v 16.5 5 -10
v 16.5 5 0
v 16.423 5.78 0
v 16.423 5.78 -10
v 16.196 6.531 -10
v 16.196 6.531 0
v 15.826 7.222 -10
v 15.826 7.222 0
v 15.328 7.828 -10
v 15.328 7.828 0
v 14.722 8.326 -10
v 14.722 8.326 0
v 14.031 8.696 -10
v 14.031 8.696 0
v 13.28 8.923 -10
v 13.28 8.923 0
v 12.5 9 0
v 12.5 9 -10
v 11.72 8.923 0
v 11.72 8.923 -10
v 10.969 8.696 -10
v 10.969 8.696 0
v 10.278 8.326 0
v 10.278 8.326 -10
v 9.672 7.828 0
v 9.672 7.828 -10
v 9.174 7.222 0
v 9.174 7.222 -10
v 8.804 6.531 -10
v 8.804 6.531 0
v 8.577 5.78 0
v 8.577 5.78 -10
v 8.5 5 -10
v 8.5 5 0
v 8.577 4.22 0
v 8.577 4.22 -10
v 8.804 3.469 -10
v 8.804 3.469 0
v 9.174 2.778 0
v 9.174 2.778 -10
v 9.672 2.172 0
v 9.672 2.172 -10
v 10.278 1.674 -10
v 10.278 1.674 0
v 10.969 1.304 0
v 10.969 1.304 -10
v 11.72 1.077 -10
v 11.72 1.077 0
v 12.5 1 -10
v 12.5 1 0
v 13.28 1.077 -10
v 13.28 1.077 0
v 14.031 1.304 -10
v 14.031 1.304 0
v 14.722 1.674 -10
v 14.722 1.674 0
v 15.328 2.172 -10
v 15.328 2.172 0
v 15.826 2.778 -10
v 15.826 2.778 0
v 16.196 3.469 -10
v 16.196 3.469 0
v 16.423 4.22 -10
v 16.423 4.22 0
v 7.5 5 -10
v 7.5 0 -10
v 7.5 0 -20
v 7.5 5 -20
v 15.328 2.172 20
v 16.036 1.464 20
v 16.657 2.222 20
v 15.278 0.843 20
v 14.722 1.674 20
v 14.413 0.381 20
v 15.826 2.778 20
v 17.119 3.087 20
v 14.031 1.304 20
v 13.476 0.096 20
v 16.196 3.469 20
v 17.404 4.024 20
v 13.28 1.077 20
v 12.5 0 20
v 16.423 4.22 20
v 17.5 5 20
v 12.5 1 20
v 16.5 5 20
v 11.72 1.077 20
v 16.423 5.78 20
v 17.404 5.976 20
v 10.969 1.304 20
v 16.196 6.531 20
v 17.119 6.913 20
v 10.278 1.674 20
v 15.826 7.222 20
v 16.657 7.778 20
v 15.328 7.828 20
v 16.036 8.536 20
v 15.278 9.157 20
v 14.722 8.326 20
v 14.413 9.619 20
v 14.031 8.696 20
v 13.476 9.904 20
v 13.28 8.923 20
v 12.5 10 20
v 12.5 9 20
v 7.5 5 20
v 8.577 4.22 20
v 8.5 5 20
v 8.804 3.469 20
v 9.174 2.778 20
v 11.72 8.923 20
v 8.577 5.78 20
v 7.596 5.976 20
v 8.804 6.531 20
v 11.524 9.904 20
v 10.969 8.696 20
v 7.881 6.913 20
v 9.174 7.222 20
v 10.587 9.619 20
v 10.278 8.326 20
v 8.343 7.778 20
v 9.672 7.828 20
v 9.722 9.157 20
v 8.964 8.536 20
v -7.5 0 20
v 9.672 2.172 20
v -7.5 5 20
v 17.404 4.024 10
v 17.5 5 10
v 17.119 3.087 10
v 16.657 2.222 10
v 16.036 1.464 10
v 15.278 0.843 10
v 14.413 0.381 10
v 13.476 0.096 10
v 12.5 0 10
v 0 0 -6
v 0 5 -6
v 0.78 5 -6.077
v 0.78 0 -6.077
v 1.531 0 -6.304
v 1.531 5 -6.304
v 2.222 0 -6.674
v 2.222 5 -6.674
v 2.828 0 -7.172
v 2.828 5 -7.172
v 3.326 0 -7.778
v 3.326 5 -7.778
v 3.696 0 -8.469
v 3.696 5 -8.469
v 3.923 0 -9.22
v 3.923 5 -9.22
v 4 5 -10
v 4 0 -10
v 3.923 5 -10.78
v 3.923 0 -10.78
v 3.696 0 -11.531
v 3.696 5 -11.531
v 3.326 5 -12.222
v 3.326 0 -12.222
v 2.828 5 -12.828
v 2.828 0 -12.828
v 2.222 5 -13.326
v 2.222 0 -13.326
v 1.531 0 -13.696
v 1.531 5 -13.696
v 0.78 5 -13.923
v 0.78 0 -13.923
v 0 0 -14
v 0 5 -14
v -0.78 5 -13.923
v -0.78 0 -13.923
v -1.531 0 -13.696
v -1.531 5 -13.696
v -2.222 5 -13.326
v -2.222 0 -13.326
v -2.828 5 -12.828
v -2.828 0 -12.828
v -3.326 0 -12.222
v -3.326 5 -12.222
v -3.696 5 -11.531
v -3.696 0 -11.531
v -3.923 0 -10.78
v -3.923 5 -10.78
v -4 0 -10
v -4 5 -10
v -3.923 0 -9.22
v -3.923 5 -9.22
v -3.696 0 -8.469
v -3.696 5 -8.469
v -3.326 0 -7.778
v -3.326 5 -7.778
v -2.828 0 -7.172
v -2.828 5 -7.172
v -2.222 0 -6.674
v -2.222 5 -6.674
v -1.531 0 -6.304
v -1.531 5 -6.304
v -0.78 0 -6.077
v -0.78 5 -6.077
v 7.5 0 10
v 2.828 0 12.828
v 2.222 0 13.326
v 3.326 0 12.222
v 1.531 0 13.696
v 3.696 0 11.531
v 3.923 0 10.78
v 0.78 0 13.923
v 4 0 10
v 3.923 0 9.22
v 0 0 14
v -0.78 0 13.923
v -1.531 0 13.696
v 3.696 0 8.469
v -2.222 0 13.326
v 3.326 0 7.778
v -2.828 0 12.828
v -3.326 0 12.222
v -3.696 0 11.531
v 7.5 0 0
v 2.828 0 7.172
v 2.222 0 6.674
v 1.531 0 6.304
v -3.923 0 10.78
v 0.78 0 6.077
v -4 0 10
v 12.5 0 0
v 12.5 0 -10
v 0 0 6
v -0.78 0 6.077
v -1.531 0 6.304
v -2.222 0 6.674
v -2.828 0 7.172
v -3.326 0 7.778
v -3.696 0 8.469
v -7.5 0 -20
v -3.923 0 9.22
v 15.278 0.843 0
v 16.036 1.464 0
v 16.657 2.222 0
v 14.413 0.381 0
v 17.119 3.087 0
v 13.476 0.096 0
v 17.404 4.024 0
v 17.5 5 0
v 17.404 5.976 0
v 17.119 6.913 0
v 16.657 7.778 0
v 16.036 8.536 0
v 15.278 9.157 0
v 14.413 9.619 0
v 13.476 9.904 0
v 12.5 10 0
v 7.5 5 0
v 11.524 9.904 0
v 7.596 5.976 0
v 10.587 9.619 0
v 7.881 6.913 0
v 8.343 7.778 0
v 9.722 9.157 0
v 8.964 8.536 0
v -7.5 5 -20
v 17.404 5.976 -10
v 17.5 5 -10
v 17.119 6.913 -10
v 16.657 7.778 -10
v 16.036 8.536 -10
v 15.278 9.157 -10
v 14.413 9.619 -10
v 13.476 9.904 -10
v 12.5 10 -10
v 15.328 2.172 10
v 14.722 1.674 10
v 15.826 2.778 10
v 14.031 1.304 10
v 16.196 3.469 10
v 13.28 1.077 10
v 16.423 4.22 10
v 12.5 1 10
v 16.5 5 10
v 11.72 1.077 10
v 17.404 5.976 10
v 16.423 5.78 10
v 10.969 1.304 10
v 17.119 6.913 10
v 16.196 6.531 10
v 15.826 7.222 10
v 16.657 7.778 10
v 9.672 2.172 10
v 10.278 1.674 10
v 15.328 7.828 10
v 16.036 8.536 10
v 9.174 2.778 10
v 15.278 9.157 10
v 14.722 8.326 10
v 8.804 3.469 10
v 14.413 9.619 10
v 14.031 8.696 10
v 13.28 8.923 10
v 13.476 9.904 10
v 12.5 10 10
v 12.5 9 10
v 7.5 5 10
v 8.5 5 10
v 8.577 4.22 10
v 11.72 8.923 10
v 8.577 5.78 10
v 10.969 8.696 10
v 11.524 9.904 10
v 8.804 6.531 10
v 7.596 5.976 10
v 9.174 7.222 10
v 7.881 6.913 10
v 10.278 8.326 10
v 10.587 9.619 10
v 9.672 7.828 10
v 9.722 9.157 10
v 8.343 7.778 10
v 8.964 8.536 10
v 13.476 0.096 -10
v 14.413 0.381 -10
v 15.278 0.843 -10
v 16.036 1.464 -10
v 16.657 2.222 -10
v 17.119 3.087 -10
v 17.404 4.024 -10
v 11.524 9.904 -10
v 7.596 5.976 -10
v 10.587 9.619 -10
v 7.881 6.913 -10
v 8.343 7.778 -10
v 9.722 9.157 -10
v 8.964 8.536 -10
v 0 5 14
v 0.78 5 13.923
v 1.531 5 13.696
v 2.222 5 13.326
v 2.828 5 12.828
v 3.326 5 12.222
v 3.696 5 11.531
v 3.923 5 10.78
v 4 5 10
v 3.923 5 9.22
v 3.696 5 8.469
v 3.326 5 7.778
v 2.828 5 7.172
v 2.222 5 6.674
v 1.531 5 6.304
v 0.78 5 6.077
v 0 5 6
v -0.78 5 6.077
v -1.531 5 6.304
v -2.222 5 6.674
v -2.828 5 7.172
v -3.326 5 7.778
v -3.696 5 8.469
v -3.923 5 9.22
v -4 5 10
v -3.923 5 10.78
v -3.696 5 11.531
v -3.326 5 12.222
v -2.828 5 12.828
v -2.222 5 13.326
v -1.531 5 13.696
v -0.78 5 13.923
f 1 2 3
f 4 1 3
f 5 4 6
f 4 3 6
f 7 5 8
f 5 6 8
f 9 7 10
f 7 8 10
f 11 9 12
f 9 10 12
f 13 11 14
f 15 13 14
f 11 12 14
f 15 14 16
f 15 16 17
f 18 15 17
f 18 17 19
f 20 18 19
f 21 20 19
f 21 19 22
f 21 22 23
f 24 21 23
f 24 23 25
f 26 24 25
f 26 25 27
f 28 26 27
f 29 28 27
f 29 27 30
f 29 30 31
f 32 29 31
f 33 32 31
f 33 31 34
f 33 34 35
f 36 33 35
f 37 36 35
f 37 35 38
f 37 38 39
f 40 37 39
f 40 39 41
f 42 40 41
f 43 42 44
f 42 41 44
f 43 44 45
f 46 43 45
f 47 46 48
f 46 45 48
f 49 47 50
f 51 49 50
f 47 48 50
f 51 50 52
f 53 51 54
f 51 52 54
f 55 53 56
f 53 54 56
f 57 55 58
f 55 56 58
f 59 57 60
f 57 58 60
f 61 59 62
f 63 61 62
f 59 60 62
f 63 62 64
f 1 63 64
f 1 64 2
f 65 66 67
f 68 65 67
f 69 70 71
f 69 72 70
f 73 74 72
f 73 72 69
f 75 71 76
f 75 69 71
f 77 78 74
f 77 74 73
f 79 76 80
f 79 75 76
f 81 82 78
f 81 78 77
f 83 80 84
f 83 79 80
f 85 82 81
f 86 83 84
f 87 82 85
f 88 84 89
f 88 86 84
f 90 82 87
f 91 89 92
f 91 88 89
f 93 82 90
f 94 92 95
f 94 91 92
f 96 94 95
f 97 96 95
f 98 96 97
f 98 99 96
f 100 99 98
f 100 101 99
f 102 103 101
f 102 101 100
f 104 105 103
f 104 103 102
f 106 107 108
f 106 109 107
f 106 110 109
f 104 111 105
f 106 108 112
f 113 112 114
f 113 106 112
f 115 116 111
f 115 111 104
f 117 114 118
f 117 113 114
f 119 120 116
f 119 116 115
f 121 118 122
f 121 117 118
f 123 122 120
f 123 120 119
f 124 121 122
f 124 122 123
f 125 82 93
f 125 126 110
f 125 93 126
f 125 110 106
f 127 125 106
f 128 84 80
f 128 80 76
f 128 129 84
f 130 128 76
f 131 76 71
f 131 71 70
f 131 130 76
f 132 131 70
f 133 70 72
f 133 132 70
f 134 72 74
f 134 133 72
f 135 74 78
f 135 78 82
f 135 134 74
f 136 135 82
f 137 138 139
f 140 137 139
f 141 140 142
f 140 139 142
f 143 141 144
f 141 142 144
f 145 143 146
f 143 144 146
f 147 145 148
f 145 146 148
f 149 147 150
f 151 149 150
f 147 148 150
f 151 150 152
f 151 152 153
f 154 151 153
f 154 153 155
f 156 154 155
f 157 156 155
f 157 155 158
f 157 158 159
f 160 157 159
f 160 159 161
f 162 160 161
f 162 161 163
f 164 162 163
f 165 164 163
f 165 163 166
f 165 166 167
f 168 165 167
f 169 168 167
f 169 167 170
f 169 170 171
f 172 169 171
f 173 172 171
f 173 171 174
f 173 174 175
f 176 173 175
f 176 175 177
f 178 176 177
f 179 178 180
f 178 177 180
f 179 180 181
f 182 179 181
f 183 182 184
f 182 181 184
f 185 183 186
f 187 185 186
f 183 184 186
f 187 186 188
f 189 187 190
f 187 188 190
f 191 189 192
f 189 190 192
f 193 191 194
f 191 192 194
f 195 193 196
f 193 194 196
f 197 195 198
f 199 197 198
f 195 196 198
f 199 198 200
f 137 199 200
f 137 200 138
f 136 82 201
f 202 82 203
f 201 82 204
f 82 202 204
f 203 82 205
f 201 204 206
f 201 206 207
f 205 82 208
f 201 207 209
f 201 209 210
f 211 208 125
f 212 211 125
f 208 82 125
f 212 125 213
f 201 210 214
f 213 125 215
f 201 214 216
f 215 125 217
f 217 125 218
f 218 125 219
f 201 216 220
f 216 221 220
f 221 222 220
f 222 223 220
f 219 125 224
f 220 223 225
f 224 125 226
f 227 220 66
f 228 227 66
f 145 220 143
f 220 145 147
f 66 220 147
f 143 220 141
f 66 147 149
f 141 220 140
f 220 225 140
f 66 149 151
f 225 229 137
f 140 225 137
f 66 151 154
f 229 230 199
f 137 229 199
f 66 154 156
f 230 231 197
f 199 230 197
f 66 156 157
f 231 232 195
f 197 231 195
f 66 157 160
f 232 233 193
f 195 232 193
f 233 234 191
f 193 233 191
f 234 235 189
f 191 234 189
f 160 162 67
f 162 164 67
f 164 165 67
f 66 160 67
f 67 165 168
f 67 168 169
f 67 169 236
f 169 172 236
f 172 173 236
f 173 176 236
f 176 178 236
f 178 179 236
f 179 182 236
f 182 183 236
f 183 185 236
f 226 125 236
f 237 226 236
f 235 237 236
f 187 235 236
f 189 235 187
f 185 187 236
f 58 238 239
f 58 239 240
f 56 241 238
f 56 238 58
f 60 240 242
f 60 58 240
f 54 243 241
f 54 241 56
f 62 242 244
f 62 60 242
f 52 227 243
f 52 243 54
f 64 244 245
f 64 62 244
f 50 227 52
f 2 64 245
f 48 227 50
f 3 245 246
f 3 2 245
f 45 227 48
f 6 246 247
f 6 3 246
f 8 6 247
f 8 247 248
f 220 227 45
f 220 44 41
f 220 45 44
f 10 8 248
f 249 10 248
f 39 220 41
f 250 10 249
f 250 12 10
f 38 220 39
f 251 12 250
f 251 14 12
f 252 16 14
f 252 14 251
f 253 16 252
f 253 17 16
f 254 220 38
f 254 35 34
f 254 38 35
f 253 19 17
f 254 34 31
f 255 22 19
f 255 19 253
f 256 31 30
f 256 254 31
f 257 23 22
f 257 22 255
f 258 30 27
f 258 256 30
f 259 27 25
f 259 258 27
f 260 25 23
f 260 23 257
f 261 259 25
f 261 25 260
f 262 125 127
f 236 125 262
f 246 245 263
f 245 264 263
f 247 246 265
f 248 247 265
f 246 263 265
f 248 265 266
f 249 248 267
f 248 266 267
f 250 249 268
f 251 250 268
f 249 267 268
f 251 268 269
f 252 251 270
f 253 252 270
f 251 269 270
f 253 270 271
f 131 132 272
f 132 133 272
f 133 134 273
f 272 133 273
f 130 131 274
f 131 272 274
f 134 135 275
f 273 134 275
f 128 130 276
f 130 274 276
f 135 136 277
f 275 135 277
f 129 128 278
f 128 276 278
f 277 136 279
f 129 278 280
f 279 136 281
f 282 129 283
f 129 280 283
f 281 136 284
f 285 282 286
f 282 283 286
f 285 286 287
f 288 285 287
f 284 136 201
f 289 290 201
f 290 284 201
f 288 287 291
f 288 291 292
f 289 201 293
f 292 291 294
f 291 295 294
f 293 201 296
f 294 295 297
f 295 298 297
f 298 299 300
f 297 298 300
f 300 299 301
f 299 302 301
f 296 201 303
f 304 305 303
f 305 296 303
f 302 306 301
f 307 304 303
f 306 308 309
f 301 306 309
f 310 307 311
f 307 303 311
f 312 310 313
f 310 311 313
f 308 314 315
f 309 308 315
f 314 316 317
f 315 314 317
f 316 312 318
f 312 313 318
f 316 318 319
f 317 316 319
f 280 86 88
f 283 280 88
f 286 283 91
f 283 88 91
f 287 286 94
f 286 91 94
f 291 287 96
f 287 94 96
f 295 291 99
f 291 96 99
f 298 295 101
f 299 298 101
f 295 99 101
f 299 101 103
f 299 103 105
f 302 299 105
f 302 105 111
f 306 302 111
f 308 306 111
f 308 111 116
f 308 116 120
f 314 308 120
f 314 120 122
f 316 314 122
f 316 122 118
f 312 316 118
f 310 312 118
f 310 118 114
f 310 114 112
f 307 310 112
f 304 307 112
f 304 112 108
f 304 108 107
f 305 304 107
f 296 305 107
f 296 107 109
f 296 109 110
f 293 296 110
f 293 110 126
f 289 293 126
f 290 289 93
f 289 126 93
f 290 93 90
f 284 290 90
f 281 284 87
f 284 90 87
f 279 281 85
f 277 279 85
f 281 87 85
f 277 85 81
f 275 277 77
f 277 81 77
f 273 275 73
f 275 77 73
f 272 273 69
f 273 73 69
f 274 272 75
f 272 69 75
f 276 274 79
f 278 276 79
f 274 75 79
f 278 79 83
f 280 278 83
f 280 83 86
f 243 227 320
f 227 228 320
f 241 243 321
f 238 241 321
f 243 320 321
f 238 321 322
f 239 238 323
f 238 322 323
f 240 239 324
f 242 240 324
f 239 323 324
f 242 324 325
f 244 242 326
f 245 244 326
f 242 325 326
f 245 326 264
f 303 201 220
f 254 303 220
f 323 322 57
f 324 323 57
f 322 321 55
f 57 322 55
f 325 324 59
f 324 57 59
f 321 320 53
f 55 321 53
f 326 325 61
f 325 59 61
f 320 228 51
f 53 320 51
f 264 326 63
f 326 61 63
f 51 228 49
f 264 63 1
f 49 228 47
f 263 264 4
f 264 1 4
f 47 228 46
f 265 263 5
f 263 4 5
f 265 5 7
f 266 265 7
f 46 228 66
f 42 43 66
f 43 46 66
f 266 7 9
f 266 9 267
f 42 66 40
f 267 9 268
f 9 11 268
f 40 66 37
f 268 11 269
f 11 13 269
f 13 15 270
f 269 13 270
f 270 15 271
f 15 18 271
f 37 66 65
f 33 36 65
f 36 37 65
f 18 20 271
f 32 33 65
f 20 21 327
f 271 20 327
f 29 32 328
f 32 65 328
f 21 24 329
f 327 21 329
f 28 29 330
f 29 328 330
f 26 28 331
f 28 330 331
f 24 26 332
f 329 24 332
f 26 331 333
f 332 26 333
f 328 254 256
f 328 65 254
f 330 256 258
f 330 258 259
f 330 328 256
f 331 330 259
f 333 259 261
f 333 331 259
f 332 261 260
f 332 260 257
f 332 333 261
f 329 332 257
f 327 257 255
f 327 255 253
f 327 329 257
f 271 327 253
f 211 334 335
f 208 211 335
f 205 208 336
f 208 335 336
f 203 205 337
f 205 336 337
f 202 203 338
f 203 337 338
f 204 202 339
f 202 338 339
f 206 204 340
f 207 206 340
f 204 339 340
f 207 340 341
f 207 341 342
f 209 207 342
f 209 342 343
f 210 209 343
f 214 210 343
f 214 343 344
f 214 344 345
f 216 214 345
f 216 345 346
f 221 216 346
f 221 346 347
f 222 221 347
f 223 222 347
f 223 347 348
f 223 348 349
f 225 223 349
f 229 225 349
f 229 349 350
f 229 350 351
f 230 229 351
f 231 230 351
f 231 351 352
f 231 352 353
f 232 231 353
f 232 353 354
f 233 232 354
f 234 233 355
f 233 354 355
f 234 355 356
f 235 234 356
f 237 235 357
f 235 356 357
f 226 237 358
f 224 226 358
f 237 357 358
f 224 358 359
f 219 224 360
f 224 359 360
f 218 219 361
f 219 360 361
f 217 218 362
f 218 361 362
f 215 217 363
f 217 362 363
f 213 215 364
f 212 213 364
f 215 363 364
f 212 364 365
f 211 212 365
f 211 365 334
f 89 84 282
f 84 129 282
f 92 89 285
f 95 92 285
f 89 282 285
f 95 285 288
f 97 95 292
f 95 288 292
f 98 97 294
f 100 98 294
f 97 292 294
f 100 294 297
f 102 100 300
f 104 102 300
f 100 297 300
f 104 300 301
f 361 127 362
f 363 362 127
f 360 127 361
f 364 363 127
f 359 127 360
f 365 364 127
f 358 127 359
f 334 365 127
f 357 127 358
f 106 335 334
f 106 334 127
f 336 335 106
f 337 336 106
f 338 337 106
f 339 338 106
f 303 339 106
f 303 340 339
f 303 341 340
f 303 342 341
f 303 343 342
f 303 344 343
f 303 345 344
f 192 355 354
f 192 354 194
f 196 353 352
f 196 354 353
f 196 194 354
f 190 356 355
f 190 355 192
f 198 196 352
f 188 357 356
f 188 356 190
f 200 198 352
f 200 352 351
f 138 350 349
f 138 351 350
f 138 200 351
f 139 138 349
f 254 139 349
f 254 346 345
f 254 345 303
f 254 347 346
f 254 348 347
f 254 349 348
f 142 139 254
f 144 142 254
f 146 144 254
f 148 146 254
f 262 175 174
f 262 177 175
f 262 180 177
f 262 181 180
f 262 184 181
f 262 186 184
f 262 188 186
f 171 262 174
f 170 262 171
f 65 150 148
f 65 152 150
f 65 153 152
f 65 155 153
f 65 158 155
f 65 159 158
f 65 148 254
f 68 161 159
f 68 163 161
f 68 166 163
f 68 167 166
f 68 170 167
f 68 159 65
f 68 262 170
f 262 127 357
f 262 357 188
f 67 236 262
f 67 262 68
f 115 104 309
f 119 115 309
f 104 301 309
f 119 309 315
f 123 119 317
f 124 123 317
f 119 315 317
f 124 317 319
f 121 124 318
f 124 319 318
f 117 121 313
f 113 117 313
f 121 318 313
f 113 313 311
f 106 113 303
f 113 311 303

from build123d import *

# Parameters (mm, degrees)
SZKIC1_W                    = 15
SZKIC1_H                    = 40
DODANIE_WYCI_GNI_CIE1_DEPTH = 5
SZKIC2_W                    = 10
SZKIC2_H                    = 10
DODANIE_WYCI_GNI_CIE2_DEPTH = 10
SZKIC3_R                    = 4
WYTNIJ_WYCI_GNI_CIE1_DEPTH  = 30
ZAOKR_GLENIE1_R             = 5
SZKIC4_R                    = 4
WYTNIJ_WYCI_GNI_CIE2_DEPTH  = 30


with BuildPart() as part:
    # Szkic1 → Dodanie-wyciągnięcie1 (new body)
    with BuildSketch(Plane(origin=(0, 0, 0), x_dir=(1, 0, 0), z_dir=(0, 1, 0))):
        Rectangle(SZKIC1_W, SZKIC1_H)
    extrude(amount=DODANIE_WYCI_GNI_CIE1_DEPTH)

    # Szkic2 → Dodanie-wyciągnięcie2 (add)
    with BuildSketch(Plane(origin=(7.5, 0, 0), x_dir=(0, 0, -1), z_dir=(1, 0, 0))):
        with Locations((-15, 5)):
            Rectangle(SZKIC2_W, SZKIC2_H)
        with Locations((5, 5)):
            Rectangle(SZKIC2_W, SZKIC2_H)
    extrude(amount=DODANIE_WYCI_GNI_CIE2_DEPTH)

    # Szkic3 → Wytnij-wyciągnięcie1 (cut)
    with BuildSketch(Plane.XY.offset(20)):
        with Locations((12.5, 5)):
            Circle(SZKIC3_R)
    extrude(amount=-WYTNIJ_WYCI_GNI_CIE1_DEPTH, mode=Mode.SUBTRACT)

    # Zaokrąglenie1
    zaokr_glenie1_edges = [part.edges().sort_by_distance(p)[0] for p in [
        (7.5, 10, 15),
        (7.5, 10, -5),
        (17.5, 0, 15),
        (17.5, 0, -5),
        (17.5, 10, -5),
        (17.5, 10, 15),
    ]]
    fillet(zaokr_glenie1_edges, radius=ZAOKR_GLENIE1_R - 0.0001)  # a hair under: the kernel refuses the full size

    # Szkic4 → Wytnij-wyciągnięcie2 (cut)
    with BuildSketch(Plane(origin=(0, 5, 0), x_dir=(1, 0, 0), z_dir=(0, 1, 0))):
        with Locations(Location((0, 10, 0), (0, 0, 270))):
            Circle(SZKIC4_R)
        with Locations(Location((0, -10, 0), (0, 0, 270))):
            Circle(SZKIC4_R)
    extrude(amount=-WYTNIJ_WYCI_GNI_CIE2_DEPTH, mode=Mode.SUBTRACT)


solid = part.part
